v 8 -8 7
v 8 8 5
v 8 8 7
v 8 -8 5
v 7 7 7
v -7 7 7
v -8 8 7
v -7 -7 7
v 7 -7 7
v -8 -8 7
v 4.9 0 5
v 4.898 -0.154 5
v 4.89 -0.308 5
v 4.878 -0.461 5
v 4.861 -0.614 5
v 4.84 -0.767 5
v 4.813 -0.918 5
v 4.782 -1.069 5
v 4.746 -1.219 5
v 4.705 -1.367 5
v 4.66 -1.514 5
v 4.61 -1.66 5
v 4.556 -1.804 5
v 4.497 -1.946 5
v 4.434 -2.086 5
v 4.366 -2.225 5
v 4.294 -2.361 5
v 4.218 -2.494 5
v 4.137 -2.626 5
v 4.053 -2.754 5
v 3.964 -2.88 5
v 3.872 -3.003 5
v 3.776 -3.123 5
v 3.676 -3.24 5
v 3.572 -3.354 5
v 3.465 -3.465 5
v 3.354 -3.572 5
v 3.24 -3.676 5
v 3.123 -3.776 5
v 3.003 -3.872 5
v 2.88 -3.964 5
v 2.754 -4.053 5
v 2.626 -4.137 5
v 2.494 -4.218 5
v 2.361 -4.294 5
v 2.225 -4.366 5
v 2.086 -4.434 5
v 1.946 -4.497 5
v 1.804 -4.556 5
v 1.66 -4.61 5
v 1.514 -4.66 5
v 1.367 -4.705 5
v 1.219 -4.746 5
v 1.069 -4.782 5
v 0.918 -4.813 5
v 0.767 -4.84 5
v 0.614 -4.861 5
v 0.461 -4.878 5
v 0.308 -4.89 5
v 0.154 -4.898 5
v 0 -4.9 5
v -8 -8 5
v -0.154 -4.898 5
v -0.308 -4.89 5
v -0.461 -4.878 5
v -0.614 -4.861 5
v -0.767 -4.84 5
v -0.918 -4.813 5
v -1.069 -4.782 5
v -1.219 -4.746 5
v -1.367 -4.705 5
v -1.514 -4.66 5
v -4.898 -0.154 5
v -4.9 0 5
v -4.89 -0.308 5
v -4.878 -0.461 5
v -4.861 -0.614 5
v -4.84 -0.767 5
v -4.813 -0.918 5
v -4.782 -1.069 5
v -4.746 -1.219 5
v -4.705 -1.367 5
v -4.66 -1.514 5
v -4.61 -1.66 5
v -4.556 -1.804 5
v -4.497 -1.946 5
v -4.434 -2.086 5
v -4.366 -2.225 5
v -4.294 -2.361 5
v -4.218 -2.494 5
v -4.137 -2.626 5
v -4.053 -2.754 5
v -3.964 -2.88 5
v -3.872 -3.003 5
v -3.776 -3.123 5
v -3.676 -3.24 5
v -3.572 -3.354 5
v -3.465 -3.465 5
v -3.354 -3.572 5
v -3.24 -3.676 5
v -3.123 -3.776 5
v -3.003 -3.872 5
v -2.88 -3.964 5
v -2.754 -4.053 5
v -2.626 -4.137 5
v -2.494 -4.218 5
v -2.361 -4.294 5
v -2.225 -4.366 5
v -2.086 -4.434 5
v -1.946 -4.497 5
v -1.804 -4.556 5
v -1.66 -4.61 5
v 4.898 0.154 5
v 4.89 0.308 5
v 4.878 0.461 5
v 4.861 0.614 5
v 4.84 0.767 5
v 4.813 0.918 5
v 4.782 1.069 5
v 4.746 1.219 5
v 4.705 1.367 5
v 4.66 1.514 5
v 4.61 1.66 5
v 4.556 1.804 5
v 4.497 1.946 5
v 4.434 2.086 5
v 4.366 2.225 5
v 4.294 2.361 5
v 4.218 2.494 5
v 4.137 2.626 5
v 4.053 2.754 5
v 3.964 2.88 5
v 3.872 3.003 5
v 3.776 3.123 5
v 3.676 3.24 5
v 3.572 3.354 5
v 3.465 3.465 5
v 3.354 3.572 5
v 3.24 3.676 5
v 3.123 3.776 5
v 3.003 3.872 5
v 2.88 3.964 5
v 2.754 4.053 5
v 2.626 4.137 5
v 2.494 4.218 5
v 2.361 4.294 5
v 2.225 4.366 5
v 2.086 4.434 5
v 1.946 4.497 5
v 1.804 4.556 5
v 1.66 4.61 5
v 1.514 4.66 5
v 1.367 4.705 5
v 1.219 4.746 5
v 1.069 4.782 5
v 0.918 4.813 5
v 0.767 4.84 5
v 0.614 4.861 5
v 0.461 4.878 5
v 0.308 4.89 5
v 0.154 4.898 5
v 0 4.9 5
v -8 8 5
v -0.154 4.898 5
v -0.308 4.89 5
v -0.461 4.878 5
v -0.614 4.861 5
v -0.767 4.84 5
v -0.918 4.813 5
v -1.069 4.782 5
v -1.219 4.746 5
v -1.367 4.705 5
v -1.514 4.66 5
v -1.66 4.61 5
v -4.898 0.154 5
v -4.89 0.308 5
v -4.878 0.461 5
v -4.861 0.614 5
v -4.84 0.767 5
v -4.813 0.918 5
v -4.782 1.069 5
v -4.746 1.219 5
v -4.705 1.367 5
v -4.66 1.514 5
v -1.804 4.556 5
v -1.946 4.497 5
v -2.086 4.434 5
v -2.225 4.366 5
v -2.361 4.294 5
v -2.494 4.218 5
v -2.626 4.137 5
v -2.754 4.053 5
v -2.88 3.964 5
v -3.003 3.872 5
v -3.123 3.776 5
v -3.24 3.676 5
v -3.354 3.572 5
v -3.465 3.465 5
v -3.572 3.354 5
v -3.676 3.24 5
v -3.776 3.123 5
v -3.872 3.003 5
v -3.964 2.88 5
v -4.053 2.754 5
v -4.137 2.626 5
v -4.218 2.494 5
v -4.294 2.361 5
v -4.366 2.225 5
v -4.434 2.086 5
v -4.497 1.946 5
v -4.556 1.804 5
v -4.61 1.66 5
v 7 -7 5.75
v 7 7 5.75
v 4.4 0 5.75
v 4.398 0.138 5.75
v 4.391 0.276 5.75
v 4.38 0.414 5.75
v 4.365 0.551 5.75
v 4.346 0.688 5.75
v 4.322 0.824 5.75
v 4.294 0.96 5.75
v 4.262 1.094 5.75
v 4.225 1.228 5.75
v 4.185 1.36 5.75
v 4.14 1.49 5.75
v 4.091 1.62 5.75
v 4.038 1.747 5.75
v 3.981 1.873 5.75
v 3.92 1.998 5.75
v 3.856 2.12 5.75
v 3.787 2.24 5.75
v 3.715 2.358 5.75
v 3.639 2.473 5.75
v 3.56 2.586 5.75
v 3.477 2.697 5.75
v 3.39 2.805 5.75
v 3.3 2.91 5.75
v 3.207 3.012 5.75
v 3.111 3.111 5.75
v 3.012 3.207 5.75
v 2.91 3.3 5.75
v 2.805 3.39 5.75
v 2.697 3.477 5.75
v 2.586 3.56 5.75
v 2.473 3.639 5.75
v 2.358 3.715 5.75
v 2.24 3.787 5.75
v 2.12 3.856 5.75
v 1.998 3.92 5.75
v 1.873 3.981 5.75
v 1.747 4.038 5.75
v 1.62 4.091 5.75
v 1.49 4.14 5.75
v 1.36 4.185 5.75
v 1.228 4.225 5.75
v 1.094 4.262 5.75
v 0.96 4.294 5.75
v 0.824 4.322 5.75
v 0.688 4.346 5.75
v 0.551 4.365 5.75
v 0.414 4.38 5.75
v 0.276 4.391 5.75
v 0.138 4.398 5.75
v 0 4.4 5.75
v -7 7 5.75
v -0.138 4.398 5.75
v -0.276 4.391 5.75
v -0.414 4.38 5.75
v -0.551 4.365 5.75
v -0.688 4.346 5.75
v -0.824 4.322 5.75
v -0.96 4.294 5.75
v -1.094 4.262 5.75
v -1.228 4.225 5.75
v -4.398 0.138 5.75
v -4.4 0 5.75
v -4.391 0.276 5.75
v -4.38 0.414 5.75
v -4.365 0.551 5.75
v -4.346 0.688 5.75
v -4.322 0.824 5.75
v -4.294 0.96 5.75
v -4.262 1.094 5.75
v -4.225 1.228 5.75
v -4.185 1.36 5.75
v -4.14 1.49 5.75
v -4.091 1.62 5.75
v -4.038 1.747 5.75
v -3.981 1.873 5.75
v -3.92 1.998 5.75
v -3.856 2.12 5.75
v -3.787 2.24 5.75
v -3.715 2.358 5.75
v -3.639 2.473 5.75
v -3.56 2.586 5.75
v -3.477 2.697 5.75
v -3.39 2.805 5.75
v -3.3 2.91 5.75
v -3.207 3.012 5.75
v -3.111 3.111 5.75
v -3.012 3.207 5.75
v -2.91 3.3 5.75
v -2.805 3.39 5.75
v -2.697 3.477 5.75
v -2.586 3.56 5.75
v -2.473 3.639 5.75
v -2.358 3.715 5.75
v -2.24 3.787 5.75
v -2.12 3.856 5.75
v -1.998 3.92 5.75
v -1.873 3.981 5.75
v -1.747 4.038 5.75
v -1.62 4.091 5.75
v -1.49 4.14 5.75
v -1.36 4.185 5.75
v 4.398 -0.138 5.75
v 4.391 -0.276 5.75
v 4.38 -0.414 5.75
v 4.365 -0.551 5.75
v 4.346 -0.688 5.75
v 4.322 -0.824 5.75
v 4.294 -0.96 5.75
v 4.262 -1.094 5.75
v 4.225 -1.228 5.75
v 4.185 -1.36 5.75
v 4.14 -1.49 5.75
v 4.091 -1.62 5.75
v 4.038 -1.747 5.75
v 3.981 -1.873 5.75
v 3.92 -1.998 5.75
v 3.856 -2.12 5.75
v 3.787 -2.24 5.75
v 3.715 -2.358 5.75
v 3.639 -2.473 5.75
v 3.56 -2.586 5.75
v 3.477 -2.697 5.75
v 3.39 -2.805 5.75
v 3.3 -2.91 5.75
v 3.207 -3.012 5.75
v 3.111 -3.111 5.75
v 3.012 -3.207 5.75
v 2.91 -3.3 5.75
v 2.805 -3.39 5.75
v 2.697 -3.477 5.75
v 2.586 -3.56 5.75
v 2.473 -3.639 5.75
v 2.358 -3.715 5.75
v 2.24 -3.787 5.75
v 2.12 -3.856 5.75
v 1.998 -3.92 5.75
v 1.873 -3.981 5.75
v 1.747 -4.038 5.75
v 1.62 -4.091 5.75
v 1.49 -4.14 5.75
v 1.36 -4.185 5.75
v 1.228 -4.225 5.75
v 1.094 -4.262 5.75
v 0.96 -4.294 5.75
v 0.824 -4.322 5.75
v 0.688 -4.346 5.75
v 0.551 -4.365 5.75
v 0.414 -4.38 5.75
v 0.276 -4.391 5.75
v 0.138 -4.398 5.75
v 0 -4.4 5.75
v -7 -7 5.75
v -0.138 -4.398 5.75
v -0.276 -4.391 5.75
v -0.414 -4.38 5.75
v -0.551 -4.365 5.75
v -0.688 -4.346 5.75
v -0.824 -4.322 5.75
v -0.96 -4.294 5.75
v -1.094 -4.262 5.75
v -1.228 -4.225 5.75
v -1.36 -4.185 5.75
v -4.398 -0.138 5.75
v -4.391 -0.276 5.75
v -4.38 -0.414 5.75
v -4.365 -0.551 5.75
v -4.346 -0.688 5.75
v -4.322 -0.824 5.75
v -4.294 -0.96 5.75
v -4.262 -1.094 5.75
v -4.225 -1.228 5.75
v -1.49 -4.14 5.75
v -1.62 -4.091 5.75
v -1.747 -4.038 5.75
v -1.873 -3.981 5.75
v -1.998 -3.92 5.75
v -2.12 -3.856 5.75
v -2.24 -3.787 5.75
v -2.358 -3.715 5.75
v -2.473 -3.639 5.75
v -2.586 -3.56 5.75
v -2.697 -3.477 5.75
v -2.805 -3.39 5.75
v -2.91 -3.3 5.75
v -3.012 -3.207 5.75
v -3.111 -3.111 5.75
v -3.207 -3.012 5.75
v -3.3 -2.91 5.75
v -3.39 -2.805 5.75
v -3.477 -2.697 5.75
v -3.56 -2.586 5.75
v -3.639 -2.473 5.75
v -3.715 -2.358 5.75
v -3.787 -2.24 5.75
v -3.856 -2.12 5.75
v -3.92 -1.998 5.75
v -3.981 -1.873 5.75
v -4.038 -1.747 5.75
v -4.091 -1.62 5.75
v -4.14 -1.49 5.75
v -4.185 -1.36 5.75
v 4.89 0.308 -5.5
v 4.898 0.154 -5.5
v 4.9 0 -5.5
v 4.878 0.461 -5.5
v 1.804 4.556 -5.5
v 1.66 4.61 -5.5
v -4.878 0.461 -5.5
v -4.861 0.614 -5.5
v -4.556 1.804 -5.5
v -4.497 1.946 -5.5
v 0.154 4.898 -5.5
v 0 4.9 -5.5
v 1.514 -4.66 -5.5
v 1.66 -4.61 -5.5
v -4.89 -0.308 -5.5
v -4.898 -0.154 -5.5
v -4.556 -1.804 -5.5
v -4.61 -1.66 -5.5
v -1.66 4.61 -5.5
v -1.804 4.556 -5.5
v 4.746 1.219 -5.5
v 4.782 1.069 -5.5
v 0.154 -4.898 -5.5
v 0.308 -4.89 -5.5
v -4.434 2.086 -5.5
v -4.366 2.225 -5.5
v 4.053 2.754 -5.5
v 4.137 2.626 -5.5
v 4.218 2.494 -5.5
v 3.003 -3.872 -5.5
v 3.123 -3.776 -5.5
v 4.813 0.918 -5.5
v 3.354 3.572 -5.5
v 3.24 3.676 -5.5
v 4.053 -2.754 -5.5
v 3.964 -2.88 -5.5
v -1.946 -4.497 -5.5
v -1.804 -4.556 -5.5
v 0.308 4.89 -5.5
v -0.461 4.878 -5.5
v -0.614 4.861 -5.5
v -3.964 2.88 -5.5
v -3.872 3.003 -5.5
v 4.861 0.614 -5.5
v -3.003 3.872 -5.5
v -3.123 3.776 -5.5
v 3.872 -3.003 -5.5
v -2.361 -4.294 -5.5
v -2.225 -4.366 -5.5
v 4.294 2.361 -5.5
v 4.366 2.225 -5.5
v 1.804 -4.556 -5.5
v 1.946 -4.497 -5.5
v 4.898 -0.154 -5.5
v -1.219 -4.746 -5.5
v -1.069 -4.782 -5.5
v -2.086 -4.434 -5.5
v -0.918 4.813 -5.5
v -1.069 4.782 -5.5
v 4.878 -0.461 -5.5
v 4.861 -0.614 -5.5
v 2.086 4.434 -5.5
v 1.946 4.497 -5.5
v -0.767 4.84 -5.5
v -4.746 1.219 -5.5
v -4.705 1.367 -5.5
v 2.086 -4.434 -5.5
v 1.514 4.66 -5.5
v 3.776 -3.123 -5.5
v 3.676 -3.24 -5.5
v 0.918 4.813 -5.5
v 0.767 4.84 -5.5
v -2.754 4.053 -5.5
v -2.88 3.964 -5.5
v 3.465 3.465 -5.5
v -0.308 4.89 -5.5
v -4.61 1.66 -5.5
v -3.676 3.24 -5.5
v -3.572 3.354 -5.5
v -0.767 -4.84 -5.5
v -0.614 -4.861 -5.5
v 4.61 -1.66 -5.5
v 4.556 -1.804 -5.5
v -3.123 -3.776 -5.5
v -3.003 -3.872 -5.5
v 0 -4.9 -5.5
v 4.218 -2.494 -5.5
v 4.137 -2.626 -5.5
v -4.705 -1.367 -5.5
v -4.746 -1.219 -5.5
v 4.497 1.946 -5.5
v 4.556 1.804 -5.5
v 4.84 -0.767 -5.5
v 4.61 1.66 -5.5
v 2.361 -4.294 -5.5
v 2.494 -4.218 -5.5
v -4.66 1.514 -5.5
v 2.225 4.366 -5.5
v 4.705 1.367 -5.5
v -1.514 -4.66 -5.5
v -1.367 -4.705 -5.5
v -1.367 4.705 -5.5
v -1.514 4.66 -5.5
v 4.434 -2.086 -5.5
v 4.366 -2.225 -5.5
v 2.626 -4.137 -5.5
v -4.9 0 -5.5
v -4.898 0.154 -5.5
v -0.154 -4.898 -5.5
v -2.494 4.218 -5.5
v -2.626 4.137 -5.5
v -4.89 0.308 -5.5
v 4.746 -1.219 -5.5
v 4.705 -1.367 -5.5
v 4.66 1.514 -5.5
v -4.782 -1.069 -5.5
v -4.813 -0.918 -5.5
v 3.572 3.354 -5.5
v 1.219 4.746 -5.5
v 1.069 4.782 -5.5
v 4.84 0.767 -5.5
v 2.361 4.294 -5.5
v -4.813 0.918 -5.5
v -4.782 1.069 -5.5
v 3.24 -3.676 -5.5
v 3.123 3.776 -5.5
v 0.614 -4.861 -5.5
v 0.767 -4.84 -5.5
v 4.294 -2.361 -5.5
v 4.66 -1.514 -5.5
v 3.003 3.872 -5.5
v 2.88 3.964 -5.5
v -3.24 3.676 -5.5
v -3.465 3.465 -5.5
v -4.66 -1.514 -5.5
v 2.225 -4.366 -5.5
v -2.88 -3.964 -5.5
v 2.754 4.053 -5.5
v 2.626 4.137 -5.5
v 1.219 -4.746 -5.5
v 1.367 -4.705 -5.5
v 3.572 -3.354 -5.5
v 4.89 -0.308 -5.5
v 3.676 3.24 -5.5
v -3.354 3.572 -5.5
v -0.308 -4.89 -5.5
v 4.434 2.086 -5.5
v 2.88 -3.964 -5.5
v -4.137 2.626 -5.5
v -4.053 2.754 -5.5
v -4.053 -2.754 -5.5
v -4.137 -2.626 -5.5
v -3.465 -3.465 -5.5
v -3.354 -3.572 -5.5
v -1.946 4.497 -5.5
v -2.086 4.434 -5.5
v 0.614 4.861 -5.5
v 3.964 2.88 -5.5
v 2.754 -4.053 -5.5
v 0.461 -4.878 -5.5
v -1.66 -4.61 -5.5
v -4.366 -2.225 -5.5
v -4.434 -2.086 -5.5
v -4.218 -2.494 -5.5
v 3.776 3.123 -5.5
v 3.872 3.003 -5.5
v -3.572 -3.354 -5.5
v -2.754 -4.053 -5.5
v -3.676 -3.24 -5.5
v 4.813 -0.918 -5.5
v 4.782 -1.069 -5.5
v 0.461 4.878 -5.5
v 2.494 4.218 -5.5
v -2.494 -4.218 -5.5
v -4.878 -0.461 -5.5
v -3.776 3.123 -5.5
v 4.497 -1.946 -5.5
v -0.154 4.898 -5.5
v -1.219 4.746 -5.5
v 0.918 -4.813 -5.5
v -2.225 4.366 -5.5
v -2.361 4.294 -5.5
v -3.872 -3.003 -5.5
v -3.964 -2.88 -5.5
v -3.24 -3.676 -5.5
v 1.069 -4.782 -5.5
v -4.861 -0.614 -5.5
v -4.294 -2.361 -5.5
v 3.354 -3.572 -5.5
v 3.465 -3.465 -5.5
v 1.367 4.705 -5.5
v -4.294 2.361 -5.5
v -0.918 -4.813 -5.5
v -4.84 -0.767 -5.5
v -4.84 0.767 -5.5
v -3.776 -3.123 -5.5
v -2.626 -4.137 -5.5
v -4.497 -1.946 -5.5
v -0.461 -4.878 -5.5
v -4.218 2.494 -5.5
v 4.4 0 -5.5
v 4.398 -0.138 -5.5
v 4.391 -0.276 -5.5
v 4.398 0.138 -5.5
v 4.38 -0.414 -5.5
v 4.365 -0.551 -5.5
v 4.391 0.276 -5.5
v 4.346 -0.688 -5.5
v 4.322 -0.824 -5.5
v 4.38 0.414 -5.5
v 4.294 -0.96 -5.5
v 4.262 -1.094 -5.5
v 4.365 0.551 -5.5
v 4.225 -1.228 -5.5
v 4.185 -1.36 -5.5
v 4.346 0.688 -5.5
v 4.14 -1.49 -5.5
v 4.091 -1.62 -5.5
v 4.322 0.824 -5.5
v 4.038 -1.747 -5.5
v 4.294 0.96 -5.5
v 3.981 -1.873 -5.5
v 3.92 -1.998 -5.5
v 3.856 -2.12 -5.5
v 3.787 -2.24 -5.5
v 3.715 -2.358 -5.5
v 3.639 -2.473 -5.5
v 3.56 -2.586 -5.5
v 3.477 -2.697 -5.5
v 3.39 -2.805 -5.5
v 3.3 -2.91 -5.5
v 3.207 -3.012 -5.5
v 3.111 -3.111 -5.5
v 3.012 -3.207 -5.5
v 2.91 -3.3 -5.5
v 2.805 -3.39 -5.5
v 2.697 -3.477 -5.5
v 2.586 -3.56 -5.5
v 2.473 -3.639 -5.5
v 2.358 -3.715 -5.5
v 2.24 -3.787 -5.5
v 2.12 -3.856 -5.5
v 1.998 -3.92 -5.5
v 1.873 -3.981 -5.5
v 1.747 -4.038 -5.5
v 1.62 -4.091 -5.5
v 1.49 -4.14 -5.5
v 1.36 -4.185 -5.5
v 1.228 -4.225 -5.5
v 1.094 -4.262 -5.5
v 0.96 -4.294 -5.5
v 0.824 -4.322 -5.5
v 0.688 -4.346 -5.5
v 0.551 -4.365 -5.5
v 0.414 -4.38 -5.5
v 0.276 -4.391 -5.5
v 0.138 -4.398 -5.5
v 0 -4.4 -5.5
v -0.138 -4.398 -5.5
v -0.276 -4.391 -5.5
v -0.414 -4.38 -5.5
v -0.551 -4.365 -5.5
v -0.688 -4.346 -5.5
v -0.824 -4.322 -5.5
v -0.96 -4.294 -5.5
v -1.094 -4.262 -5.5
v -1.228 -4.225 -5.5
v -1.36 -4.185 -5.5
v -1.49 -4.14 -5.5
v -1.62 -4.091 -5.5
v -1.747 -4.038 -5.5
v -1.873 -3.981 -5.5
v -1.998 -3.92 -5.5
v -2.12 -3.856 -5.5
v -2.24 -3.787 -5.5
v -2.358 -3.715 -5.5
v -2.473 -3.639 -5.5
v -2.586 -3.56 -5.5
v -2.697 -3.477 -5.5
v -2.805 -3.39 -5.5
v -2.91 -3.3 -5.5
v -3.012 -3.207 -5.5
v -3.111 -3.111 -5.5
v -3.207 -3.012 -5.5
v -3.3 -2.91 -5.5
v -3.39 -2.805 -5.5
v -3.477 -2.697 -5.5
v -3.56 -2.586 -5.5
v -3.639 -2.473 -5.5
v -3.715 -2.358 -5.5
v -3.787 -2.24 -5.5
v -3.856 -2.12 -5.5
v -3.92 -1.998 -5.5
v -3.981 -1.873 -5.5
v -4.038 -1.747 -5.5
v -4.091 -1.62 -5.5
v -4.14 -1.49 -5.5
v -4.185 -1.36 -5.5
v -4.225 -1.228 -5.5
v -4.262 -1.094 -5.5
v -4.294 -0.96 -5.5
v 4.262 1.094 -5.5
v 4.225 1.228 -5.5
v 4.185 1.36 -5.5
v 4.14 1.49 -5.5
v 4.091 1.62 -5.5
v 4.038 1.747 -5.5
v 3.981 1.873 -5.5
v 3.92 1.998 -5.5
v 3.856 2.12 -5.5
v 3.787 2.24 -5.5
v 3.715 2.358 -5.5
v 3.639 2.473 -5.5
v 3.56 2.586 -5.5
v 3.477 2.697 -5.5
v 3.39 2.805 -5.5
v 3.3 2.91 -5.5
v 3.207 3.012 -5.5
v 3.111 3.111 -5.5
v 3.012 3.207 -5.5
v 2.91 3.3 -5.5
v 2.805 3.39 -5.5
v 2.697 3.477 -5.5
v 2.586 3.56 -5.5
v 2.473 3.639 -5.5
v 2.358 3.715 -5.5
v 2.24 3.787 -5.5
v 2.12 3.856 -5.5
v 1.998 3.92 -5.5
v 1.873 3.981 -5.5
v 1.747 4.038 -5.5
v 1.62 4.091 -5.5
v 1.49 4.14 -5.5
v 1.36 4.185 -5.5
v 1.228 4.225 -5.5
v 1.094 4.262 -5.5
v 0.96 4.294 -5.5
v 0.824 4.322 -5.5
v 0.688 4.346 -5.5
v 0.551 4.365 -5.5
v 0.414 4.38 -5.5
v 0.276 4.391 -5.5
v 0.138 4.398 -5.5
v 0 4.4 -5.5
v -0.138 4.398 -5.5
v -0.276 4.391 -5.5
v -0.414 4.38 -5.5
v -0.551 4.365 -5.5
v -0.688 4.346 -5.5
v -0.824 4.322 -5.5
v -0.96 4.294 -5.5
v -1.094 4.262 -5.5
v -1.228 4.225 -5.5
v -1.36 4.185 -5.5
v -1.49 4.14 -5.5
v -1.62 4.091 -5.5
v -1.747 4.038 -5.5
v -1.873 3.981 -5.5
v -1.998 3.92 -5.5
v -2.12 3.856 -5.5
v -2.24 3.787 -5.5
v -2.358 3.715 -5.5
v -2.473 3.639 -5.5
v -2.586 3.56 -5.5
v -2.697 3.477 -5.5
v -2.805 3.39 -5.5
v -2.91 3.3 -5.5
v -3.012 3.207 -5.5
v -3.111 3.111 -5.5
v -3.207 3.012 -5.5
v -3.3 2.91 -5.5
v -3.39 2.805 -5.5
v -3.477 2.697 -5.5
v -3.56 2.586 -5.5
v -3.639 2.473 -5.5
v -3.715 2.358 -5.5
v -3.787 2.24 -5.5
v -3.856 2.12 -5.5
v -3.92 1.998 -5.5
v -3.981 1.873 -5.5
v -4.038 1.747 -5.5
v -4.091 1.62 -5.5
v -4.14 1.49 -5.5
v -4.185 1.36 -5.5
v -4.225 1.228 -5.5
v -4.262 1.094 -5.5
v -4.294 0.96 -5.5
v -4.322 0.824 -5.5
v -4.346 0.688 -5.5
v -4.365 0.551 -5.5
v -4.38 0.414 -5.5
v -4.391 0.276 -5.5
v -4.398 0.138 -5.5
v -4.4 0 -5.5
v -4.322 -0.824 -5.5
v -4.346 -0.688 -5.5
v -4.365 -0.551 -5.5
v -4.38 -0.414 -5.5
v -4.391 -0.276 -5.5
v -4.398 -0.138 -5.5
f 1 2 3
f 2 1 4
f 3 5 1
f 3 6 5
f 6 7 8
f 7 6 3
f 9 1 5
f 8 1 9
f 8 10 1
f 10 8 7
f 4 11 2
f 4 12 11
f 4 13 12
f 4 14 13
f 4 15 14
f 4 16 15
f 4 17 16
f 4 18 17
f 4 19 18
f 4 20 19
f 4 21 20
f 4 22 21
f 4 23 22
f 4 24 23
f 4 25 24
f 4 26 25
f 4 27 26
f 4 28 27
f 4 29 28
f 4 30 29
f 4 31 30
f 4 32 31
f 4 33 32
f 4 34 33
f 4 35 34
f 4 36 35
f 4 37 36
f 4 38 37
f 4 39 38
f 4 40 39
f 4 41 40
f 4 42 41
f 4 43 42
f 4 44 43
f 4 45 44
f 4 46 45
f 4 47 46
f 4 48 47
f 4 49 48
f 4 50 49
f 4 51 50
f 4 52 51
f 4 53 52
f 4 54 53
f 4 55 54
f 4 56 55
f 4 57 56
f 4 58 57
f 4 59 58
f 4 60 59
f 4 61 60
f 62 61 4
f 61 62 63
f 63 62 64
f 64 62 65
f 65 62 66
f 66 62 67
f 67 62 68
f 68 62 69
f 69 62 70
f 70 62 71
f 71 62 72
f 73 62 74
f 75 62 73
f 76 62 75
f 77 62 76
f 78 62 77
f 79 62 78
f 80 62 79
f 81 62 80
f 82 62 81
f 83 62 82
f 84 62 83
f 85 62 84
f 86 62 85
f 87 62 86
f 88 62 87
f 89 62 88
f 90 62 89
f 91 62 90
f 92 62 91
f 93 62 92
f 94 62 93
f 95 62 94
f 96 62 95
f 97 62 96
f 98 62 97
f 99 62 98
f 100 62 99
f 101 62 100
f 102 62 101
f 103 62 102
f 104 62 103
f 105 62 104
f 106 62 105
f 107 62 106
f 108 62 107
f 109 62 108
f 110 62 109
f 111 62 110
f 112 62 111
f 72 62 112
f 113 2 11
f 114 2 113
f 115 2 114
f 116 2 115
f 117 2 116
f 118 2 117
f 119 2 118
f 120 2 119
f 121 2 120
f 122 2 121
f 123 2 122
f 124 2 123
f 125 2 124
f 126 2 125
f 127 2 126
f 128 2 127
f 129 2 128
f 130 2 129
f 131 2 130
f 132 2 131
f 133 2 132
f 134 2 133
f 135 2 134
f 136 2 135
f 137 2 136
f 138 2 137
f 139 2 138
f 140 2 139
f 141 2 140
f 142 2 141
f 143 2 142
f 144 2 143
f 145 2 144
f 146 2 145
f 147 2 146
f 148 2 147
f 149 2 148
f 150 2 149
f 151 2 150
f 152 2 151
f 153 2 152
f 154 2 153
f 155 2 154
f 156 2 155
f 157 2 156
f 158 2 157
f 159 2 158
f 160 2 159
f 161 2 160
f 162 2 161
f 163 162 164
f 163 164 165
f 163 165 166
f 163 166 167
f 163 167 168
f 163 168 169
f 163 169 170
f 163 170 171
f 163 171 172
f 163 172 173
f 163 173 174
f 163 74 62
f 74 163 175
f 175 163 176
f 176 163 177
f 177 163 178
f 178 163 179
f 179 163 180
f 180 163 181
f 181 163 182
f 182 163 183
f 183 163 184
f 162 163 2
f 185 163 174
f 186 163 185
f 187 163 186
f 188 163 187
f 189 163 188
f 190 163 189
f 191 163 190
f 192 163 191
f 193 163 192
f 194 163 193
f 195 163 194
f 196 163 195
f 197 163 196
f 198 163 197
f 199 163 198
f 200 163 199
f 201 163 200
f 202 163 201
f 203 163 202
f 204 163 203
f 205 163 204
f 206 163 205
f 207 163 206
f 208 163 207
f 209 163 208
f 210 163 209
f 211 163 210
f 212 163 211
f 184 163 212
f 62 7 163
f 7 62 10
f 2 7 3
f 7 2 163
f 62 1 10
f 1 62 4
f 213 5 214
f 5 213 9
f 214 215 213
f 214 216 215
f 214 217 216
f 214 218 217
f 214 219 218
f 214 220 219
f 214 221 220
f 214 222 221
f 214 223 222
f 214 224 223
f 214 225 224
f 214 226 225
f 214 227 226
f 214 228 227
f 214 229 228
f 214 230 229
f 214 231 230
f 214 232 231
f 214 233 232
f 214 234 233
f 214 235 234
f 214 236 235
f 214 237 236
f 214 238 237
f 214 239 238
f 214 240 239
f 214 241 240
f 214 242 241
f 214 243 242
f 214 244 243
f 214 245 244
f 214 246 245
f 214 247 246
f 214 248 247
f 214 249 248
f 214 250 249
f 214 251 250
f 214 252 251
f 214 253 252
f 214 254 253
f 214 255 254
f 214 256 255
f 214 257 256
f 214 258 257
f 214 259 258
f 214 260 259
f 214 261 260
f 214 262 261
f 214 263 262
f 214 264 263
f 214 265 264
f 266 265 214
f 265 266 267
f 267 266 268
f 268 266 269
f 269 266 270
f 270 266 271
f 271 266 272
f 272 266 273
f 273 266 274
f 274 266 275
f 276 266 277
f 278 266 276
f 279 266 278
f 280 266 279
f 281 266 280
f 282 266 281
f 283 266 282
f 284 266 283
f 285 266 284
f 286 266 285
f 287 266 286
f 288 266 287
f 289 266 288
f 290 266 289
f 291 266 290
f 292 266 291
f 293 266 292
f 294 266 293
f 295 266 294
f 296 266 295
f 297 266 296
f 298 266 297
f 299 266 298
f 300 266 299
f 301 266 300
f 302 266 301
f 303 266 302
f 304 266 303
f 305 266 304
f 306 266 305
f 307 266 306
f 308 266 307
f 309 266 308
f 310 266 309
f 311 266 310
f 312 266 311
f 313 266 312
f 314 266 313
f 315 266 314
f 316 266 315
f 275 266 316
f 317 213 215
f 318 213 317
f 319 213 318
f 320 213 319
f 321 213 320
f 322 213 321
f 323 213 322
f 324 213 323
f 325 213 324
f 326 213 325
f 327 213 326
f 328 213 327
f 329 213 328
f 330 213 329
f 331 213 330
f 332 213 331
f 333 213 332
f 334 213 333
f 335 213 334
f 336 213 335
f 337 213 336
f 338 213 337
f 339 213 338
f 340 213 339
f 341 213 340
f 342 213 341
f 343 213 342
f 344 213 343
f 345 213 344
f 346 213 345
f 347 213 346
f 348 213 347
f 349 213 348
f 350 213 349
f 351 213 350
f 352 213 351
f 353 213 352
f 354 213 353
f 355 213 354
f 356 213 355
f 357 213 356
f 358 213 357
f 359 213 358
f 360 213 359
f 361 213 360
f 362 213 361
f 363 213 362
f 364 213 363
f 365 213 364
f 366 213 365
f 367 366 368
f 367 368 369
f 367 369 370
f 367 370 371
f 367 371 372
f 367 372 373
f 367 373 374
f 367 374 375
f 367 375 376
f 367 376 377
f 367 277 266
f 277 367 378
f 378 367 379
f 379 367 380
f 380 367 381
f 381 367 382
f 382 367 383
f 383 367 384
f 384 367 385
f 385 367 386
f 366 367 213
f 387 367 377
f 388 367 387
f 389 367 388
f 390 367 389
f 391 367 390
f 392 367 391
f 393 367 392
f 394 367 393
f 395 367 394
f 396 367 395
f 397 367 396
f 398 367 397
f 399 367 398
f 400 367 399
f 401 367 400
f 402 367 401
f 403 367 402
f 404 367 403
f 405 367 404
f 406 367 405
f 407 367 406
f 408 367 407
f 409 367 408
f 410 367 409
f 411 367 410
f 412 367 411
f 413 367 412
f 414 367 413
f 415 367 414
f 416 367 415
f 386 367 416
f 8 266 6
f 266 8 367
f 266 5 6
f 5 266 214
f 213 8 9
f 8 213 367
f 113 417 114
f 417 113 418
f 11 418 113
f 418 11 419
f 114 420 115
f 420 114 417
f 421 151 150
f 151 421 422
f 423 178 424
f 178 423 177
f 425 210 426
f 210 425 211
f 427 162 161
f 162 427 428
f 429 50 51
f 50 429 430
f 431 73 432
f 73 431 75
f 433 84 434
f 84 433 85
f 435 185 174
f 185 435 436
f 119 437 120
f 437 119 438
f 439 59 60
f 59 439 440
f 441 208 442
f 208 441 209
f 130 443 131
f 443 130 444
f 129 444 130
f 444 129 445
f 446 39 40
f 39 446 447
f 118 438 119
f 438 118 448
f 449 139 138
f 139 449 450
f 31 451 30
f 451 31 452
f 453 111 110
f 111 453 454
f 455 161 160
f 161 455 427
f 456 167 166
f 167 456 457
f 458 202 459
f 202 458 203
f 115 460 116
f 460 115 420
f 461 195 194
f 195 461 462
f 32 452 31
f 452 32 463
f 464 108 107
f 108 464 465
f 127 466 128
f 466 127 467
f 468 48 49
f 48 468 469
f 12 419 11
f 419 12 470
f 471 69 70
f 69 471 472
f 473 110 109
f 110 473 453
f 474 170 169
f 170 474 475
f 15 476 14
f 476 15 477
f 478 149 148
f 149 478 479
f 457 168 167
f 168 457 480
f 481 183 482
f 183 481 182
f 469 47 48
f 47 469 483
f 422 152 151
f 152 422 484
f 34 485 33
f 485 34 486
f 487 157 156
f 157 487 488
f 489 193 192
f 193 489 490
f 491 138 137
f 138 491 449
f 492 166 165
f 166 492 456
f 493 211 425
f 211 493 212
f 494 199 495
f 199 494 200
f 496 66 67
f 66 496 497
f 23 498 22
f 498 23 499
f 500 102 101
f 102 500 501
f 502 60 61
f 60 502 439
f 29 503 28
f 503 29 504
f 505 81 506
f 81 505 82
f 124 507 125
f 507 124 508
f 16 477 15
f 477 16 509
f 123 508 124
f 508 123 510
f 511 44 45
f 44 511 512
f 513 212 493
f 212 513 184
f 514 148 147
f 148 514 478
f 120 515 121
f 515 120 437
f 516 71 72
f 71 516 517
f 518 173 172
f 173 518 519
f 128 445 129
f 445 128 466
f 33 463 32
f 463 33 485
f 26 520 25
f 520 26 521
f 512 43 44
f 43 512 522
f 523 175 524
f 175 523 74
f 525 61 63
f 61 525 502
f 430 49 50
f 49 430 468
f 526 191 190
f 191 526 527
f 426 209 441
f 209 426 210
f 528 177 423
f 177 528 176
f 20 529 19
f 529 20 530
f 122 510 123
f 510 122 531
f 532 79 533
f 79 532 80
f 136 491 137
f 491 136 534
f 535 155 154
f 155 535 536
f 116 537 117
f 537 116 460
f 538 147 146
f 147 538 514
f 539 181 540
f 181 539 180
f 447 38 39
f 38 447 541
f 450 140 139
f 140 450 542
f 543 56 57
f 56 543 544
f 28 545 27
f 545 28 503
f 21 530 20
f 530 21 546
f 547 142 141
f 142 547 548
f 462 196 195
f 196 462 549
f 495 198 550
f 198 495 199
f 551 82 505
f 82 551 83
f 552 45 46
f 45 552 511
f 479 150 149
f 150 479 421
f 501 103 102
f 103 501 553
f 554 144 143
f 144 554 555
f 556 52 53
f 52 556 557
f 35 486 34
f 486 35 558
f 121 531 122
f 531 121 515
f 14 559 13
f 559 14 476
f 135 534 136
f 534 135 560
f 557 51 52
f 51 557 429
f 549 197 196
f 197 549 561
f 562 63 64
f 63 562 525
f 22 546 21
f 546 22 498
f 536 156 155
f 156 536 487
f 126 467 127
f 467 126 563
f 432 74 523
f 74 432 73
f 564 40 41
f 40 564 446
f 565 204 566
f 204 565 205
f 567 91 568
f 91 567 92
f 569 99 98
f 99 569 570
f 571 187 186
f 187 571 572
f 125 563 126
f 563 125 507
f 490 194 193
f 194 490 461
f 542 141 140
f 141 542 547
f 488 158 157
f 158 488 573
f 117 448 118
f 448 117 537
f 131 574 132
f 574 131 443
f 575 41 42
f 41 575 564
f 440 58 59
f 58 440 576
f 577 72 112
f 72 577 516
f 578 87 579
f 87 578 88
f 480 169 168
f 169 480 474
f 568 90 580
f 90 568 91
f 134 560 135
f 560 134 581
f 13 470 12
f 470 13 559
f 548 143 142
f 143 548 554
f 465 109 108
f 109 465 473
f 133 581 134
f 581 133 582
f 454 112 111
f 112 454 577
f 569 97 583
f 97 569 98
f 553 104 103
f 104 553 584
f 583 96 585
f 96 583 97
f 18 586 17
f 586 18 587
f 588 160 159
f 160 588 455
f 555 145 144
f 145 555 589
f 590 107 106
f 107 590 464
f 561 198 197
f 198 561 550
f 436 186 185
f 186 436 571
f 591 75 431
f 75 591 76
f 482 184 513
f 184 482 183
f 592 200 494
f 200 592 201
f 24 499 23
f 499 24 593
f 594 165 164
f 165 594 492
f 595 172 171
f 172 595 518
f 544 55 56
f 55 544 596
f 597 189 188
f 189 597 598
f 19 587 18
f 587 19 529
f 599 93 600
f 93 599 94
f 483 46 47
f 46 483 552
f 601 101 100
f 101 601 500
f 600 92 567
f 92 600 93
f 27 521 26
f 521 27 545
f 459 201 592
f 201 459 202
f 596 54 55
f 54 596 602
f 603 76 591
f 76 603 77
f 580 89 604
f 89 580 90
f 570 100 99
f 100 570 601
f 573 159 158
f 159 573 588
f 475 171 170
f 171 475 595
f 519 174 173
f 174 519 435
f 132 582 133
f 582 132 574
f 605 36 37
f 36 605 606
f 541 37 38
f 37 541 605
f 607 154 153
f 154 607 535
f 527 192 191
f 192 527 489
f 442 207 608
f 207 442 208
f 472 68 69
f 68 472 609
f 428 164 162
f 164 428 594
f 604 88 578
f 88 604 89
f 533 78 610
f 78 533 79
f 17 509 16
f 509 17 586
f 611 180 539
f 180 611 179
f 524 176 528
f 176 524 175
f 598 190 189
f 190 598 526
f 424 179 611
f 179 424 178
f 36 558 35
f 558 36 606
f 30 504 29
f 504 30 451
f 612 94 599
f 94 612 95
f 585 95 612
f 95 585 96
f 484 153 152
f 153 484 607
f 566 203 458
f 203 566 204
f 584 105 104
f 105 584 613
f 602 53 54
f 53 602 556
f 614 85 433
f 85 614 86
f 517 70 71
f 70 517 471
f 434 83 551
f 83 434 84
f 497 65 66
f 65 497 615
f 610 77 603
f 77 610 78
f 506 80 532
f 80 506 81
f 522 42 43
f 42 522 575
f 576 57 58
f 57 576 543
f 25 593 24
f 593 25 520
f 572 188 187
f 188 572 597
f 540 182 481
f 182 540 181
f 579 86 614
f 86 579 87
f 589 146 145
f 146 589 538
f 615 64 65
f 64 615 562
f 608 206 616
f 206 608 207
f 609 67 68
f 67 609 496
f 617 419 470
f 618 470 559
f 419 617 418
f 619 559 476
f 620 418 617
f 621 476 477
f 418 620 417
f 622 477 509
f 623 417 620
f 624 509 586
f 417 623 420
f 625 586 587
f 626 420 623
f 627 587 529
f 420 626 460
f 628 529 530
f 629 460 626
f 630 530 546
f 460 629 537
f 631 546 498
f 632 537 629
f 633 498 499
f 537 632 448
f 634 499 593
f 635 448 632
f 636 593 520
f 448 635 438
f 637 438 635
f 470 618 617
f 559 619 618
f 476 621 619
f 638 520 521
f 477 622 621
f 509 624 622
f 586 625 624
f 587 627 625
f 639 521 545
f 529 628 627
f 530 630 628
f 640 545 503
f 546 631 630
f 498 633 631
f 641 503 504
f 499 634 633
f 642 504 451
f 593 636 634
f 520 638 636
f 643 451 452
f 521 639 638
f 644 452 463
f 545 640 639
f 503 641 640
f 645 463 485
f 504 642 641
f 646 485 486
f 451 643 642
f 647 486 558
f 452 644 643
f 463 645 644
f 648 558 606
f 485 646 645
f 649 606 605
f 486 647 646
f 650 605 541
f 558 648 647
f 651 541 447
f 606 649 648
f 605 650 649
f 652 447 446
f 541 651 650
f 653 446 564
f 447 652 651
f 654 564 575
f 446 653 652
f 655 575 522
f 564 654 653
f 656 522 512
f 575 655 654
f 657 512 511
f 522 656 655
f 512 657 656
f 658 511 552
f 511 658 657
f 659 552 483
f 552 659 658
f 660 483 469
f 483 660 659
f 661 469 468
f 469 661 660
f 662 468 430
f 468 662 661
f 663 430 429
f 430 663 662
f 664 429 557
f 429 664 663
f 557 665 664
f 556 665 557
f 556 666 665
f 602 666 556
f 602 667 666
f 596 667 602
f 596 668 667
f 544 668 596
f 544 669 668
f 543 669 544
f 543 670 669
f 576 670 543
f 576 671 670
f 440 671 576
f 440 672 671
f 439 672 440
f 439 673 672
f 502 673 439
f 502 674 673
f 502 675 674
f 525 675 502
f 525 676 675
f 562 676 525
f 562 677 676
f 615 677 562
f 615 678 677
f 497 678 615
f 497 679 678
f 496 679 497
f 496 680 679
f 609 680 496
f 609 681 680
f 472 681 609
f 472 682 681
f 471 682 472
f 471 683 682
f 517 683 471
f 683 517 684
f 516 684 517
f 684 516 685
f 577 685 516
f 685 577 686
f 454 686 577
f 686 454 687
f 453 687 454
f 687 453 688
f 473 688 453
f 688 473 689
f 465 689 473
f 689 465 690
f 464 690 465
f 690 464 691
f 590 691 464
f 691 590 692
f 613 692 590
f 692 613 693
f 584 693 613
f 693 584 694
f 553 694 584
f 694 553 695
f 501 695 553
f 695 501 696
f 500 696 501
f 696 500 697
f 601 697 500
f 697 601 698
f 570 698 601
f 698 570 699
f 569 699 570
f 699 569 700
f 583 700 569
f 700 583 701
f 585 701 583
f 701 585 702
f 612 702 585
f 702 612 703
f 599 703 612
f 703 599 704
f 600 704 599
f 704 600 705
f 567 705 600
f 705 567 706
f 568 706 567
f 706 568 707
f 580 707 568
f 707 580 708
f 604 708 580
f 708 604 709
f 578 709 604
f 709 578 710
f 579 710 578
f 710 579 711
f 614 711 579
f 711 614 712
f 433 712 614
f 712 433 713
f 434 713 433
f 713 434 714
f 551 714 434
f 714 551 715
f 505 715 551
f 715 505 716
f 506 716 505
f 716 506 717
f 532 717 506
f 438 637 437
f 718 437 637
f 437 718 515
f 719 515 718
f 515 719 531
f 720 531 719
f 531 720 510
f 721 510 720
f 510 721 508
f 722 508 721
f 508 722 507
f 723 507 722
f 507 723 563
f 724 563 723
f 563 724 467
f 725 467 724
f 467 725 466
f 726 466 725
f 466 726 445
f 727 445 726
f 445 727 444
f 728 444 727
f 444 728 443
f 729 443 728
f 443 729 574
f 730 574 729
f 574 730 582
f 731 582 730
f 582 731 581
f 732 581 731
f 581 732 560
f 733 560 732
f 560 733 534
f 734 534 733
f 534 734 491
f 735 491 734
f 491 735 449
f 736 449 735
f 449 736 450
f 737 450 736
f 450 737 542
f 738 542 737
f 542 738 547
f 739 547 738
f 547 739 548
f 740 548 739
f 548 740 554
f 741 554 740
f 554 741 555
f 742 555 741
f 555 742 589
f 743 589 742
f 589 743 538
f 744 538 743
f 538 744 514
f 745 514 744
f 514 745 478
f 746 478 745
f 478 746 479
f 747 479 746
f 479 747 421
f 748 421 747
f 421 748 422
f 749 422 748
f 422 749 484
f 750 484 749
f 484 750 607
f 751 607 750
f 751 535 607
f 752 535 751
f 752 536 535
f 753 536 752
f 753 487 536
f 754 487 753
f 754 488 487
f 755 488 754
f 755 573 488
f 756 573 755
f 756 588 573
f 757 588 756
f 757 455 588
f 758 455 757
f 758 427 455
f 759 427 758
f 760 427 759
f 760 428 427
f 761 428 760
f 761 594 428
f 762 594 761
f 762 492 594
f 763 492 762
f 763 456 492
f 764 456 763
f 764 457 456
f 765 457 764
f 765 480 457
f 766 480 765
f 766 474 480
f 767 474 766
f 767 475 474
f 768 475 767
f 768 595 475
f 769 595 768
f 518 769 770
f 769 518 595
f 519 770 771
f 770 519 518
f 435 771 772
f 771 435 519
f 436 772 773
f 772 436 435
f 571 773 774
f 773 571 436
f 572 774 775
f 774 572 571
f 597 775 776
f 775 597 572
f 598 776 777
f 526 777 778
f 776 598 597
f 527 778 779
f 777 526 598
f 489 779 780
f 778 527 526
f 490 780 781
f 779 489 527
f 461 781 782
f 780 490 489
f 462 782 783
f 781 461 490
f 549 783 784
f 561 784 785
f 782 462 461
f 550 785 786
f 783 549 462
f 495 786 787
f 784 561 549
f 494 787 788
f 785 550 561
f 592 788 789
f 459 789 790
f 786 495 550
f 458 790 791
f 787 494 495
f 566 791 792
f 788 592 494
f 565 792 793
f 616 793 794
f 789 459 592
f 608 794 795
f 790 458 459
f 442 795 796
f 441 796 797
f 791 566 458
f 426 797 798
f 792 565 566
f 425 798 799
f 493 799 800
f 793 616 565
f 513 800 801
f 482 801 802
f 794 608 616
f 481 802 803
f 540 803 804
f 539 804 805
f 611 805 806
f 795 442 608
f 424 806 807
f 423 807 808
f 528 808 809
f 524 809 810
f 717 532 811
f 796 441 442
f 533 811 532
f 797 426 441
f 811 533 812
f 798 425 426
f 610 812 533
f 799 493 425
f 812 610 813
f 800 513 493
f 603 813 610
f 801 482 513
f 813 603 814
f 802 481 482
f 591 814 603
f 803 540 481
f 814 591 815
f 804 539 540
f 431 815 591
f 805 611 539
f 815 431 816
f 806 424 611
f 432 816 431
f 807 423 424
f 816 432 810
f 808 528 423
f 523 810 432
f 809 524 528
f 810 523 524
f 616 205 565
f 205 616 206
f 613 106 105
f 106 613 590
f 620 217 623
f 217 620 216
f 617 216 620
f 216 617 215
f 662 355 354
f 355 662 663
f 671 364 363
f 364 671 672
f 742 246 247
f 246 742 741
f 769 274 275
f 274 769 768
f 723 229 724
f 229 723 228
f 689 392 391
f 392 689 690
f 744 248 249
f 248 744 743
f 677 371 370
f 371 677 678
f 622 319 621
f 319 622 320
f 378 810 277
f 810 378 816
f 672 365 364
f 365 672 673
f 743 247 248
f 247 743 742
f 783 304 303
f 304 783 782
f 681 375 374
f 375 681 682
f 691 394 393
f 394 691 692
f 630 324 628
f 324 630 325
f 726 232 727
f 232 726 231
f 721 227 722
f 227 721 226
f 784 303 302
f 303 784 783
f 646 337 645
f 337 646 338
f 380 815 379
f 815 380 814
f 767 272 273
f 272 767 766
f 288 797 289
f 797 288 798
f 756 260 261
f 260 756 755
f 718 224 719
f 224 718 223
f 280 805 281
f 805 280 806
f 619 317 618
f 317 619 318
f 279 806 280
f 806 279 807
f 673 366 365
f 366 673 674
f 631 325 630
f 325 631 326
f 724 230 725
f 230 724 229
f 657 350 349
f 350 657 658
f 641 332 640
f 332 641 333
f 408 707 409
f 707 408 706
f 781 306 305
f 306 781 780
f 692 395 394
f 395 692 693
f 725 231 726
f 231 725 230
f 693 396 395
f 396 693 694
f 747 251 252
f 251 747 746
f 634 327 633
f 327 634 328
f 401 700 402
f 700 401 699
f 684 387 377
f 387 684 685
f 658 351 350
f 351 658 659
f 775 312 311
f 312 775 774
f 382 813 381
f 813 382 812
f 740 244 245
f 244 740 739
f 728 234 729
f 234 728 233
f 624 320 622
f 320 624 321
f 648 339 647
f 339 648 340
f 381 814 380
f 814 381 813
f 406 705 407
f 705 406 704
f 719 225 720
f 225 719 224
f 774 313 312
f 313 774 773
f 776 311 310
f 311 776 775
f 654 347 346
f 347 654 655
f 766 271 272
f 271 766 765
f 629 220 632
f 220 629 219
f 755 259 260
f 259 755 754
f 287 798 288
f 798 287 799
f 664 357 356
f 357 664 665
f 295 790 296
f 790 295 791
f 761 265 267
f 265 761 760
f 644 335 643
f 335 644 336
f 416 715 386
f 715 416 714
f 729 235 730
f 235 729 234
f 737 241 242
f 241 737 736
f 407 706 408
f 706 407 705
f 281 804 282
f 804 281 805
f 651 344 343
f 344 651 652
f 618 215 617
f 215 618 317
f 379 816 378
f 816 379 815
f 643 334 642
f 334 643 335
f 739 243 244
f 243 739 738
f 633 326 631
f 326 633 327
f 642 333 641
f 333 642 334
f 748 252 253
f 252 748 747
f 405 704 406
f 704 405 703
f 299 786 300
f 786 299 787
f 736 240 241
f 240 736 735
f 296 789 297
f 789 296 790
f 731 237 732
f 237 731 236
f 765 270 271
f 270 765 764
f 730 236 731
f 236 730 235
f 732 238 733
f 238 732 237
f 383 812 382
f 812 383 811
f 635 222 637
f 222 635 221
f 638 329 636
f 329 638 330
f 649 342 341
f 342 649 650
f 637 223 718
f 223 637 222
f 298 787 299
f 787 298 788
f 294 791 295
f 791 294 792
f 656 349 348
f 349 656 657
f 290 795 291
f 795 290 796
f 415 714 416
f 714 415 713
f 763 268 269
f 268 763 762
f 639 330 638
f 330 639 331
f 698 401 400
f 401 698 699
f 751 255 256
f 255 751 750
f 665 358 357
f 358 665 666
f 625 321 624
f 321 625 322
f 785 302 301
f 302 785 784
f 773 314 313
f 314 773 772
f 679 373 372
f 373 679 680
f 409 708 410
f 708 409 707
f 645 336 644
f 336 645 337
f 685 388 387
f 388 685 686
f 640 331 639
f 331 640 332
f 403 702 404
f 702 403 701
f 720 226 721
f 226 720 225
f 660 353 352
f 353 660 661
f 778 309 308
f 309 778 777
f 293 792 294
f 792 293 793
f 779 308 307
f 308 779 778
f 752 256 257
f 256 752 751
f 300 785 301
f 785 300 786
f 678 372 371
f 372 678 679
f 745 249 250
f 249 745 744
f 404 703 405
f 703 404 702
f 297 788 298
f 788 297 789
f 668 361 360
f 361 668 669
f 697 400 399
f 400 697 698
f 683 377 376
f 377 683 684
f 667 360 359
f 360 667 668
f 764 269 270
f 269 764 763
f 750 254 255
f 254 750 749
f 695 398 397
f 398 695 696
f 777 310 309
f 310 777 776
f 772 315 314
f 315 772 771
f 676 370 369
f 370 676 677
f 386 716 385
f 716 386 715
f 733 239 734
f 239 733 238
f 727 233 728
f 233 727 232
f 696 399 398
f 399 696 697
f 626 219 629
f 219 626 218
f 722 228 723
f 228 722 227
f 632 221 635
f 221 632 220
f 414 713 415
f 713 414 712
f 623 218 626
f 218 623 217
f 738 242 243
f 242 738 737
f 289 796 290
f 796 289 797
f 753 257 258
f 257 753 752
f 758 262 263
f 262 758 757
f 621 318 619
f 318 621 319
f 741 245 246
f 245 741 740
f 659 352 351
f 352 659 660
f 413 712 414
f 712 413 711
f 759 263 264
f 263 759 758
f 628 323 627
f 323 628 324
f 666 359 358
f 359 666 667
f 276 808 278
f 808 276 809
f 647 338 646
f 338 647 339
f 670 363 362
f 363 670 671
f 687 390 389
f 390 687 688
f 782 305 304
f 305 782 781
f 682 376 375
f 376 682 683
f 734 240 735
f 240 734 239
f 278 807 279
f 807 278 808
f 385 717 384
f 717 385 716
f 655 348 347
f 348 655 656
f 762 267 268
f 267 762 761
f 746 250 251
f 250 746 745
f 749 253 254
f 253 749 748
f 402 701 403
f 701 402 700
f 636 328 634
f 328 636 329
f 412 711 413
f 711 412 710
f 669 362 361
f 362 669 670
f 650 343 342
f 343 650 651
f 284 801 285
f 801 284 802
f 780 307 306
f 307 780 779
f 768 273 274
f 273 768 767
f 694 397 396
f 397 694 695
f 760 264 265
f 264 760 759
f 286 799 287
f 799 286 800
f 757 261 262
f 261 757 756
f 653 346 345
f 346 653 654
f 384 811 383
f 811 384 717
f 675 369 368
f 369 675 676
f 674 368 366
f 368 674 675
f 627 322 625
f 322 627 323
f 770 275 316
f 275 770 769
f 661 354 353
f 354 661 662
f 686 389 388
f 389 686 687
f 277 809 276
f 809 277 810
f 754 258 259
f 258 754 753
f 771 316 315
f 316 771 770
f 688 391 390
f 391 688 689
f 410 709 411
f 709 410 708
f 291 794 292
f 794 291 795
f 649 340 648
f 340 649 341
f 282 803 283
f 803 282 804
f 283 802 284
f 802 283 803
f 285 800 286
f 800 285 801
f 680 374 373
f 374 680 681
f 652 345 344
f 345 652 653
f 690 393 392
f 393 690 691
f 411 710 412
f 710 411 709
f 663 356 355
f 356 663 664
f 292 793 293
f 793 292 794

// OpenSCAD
difference(){
union(){
//This is the main cylinder
translate([0, 0, 0]) cylinder( h = 11, d = 9.8, center = true, $fn = 200);

// this makes the seat for CMOS (sqaure shaped) 
difference(){
translate([0, 0, 6])cube([16, 16, 2], center = true);
translate([0, 0, 6.5])cube([14, 14, 1.5], center = true);
}
}
//this hollows out the whole thing to opne optical path.
translate([0, 0, 0]) cylinder( h = 15, d = 8.8, center = true, $fn = 200);
}
